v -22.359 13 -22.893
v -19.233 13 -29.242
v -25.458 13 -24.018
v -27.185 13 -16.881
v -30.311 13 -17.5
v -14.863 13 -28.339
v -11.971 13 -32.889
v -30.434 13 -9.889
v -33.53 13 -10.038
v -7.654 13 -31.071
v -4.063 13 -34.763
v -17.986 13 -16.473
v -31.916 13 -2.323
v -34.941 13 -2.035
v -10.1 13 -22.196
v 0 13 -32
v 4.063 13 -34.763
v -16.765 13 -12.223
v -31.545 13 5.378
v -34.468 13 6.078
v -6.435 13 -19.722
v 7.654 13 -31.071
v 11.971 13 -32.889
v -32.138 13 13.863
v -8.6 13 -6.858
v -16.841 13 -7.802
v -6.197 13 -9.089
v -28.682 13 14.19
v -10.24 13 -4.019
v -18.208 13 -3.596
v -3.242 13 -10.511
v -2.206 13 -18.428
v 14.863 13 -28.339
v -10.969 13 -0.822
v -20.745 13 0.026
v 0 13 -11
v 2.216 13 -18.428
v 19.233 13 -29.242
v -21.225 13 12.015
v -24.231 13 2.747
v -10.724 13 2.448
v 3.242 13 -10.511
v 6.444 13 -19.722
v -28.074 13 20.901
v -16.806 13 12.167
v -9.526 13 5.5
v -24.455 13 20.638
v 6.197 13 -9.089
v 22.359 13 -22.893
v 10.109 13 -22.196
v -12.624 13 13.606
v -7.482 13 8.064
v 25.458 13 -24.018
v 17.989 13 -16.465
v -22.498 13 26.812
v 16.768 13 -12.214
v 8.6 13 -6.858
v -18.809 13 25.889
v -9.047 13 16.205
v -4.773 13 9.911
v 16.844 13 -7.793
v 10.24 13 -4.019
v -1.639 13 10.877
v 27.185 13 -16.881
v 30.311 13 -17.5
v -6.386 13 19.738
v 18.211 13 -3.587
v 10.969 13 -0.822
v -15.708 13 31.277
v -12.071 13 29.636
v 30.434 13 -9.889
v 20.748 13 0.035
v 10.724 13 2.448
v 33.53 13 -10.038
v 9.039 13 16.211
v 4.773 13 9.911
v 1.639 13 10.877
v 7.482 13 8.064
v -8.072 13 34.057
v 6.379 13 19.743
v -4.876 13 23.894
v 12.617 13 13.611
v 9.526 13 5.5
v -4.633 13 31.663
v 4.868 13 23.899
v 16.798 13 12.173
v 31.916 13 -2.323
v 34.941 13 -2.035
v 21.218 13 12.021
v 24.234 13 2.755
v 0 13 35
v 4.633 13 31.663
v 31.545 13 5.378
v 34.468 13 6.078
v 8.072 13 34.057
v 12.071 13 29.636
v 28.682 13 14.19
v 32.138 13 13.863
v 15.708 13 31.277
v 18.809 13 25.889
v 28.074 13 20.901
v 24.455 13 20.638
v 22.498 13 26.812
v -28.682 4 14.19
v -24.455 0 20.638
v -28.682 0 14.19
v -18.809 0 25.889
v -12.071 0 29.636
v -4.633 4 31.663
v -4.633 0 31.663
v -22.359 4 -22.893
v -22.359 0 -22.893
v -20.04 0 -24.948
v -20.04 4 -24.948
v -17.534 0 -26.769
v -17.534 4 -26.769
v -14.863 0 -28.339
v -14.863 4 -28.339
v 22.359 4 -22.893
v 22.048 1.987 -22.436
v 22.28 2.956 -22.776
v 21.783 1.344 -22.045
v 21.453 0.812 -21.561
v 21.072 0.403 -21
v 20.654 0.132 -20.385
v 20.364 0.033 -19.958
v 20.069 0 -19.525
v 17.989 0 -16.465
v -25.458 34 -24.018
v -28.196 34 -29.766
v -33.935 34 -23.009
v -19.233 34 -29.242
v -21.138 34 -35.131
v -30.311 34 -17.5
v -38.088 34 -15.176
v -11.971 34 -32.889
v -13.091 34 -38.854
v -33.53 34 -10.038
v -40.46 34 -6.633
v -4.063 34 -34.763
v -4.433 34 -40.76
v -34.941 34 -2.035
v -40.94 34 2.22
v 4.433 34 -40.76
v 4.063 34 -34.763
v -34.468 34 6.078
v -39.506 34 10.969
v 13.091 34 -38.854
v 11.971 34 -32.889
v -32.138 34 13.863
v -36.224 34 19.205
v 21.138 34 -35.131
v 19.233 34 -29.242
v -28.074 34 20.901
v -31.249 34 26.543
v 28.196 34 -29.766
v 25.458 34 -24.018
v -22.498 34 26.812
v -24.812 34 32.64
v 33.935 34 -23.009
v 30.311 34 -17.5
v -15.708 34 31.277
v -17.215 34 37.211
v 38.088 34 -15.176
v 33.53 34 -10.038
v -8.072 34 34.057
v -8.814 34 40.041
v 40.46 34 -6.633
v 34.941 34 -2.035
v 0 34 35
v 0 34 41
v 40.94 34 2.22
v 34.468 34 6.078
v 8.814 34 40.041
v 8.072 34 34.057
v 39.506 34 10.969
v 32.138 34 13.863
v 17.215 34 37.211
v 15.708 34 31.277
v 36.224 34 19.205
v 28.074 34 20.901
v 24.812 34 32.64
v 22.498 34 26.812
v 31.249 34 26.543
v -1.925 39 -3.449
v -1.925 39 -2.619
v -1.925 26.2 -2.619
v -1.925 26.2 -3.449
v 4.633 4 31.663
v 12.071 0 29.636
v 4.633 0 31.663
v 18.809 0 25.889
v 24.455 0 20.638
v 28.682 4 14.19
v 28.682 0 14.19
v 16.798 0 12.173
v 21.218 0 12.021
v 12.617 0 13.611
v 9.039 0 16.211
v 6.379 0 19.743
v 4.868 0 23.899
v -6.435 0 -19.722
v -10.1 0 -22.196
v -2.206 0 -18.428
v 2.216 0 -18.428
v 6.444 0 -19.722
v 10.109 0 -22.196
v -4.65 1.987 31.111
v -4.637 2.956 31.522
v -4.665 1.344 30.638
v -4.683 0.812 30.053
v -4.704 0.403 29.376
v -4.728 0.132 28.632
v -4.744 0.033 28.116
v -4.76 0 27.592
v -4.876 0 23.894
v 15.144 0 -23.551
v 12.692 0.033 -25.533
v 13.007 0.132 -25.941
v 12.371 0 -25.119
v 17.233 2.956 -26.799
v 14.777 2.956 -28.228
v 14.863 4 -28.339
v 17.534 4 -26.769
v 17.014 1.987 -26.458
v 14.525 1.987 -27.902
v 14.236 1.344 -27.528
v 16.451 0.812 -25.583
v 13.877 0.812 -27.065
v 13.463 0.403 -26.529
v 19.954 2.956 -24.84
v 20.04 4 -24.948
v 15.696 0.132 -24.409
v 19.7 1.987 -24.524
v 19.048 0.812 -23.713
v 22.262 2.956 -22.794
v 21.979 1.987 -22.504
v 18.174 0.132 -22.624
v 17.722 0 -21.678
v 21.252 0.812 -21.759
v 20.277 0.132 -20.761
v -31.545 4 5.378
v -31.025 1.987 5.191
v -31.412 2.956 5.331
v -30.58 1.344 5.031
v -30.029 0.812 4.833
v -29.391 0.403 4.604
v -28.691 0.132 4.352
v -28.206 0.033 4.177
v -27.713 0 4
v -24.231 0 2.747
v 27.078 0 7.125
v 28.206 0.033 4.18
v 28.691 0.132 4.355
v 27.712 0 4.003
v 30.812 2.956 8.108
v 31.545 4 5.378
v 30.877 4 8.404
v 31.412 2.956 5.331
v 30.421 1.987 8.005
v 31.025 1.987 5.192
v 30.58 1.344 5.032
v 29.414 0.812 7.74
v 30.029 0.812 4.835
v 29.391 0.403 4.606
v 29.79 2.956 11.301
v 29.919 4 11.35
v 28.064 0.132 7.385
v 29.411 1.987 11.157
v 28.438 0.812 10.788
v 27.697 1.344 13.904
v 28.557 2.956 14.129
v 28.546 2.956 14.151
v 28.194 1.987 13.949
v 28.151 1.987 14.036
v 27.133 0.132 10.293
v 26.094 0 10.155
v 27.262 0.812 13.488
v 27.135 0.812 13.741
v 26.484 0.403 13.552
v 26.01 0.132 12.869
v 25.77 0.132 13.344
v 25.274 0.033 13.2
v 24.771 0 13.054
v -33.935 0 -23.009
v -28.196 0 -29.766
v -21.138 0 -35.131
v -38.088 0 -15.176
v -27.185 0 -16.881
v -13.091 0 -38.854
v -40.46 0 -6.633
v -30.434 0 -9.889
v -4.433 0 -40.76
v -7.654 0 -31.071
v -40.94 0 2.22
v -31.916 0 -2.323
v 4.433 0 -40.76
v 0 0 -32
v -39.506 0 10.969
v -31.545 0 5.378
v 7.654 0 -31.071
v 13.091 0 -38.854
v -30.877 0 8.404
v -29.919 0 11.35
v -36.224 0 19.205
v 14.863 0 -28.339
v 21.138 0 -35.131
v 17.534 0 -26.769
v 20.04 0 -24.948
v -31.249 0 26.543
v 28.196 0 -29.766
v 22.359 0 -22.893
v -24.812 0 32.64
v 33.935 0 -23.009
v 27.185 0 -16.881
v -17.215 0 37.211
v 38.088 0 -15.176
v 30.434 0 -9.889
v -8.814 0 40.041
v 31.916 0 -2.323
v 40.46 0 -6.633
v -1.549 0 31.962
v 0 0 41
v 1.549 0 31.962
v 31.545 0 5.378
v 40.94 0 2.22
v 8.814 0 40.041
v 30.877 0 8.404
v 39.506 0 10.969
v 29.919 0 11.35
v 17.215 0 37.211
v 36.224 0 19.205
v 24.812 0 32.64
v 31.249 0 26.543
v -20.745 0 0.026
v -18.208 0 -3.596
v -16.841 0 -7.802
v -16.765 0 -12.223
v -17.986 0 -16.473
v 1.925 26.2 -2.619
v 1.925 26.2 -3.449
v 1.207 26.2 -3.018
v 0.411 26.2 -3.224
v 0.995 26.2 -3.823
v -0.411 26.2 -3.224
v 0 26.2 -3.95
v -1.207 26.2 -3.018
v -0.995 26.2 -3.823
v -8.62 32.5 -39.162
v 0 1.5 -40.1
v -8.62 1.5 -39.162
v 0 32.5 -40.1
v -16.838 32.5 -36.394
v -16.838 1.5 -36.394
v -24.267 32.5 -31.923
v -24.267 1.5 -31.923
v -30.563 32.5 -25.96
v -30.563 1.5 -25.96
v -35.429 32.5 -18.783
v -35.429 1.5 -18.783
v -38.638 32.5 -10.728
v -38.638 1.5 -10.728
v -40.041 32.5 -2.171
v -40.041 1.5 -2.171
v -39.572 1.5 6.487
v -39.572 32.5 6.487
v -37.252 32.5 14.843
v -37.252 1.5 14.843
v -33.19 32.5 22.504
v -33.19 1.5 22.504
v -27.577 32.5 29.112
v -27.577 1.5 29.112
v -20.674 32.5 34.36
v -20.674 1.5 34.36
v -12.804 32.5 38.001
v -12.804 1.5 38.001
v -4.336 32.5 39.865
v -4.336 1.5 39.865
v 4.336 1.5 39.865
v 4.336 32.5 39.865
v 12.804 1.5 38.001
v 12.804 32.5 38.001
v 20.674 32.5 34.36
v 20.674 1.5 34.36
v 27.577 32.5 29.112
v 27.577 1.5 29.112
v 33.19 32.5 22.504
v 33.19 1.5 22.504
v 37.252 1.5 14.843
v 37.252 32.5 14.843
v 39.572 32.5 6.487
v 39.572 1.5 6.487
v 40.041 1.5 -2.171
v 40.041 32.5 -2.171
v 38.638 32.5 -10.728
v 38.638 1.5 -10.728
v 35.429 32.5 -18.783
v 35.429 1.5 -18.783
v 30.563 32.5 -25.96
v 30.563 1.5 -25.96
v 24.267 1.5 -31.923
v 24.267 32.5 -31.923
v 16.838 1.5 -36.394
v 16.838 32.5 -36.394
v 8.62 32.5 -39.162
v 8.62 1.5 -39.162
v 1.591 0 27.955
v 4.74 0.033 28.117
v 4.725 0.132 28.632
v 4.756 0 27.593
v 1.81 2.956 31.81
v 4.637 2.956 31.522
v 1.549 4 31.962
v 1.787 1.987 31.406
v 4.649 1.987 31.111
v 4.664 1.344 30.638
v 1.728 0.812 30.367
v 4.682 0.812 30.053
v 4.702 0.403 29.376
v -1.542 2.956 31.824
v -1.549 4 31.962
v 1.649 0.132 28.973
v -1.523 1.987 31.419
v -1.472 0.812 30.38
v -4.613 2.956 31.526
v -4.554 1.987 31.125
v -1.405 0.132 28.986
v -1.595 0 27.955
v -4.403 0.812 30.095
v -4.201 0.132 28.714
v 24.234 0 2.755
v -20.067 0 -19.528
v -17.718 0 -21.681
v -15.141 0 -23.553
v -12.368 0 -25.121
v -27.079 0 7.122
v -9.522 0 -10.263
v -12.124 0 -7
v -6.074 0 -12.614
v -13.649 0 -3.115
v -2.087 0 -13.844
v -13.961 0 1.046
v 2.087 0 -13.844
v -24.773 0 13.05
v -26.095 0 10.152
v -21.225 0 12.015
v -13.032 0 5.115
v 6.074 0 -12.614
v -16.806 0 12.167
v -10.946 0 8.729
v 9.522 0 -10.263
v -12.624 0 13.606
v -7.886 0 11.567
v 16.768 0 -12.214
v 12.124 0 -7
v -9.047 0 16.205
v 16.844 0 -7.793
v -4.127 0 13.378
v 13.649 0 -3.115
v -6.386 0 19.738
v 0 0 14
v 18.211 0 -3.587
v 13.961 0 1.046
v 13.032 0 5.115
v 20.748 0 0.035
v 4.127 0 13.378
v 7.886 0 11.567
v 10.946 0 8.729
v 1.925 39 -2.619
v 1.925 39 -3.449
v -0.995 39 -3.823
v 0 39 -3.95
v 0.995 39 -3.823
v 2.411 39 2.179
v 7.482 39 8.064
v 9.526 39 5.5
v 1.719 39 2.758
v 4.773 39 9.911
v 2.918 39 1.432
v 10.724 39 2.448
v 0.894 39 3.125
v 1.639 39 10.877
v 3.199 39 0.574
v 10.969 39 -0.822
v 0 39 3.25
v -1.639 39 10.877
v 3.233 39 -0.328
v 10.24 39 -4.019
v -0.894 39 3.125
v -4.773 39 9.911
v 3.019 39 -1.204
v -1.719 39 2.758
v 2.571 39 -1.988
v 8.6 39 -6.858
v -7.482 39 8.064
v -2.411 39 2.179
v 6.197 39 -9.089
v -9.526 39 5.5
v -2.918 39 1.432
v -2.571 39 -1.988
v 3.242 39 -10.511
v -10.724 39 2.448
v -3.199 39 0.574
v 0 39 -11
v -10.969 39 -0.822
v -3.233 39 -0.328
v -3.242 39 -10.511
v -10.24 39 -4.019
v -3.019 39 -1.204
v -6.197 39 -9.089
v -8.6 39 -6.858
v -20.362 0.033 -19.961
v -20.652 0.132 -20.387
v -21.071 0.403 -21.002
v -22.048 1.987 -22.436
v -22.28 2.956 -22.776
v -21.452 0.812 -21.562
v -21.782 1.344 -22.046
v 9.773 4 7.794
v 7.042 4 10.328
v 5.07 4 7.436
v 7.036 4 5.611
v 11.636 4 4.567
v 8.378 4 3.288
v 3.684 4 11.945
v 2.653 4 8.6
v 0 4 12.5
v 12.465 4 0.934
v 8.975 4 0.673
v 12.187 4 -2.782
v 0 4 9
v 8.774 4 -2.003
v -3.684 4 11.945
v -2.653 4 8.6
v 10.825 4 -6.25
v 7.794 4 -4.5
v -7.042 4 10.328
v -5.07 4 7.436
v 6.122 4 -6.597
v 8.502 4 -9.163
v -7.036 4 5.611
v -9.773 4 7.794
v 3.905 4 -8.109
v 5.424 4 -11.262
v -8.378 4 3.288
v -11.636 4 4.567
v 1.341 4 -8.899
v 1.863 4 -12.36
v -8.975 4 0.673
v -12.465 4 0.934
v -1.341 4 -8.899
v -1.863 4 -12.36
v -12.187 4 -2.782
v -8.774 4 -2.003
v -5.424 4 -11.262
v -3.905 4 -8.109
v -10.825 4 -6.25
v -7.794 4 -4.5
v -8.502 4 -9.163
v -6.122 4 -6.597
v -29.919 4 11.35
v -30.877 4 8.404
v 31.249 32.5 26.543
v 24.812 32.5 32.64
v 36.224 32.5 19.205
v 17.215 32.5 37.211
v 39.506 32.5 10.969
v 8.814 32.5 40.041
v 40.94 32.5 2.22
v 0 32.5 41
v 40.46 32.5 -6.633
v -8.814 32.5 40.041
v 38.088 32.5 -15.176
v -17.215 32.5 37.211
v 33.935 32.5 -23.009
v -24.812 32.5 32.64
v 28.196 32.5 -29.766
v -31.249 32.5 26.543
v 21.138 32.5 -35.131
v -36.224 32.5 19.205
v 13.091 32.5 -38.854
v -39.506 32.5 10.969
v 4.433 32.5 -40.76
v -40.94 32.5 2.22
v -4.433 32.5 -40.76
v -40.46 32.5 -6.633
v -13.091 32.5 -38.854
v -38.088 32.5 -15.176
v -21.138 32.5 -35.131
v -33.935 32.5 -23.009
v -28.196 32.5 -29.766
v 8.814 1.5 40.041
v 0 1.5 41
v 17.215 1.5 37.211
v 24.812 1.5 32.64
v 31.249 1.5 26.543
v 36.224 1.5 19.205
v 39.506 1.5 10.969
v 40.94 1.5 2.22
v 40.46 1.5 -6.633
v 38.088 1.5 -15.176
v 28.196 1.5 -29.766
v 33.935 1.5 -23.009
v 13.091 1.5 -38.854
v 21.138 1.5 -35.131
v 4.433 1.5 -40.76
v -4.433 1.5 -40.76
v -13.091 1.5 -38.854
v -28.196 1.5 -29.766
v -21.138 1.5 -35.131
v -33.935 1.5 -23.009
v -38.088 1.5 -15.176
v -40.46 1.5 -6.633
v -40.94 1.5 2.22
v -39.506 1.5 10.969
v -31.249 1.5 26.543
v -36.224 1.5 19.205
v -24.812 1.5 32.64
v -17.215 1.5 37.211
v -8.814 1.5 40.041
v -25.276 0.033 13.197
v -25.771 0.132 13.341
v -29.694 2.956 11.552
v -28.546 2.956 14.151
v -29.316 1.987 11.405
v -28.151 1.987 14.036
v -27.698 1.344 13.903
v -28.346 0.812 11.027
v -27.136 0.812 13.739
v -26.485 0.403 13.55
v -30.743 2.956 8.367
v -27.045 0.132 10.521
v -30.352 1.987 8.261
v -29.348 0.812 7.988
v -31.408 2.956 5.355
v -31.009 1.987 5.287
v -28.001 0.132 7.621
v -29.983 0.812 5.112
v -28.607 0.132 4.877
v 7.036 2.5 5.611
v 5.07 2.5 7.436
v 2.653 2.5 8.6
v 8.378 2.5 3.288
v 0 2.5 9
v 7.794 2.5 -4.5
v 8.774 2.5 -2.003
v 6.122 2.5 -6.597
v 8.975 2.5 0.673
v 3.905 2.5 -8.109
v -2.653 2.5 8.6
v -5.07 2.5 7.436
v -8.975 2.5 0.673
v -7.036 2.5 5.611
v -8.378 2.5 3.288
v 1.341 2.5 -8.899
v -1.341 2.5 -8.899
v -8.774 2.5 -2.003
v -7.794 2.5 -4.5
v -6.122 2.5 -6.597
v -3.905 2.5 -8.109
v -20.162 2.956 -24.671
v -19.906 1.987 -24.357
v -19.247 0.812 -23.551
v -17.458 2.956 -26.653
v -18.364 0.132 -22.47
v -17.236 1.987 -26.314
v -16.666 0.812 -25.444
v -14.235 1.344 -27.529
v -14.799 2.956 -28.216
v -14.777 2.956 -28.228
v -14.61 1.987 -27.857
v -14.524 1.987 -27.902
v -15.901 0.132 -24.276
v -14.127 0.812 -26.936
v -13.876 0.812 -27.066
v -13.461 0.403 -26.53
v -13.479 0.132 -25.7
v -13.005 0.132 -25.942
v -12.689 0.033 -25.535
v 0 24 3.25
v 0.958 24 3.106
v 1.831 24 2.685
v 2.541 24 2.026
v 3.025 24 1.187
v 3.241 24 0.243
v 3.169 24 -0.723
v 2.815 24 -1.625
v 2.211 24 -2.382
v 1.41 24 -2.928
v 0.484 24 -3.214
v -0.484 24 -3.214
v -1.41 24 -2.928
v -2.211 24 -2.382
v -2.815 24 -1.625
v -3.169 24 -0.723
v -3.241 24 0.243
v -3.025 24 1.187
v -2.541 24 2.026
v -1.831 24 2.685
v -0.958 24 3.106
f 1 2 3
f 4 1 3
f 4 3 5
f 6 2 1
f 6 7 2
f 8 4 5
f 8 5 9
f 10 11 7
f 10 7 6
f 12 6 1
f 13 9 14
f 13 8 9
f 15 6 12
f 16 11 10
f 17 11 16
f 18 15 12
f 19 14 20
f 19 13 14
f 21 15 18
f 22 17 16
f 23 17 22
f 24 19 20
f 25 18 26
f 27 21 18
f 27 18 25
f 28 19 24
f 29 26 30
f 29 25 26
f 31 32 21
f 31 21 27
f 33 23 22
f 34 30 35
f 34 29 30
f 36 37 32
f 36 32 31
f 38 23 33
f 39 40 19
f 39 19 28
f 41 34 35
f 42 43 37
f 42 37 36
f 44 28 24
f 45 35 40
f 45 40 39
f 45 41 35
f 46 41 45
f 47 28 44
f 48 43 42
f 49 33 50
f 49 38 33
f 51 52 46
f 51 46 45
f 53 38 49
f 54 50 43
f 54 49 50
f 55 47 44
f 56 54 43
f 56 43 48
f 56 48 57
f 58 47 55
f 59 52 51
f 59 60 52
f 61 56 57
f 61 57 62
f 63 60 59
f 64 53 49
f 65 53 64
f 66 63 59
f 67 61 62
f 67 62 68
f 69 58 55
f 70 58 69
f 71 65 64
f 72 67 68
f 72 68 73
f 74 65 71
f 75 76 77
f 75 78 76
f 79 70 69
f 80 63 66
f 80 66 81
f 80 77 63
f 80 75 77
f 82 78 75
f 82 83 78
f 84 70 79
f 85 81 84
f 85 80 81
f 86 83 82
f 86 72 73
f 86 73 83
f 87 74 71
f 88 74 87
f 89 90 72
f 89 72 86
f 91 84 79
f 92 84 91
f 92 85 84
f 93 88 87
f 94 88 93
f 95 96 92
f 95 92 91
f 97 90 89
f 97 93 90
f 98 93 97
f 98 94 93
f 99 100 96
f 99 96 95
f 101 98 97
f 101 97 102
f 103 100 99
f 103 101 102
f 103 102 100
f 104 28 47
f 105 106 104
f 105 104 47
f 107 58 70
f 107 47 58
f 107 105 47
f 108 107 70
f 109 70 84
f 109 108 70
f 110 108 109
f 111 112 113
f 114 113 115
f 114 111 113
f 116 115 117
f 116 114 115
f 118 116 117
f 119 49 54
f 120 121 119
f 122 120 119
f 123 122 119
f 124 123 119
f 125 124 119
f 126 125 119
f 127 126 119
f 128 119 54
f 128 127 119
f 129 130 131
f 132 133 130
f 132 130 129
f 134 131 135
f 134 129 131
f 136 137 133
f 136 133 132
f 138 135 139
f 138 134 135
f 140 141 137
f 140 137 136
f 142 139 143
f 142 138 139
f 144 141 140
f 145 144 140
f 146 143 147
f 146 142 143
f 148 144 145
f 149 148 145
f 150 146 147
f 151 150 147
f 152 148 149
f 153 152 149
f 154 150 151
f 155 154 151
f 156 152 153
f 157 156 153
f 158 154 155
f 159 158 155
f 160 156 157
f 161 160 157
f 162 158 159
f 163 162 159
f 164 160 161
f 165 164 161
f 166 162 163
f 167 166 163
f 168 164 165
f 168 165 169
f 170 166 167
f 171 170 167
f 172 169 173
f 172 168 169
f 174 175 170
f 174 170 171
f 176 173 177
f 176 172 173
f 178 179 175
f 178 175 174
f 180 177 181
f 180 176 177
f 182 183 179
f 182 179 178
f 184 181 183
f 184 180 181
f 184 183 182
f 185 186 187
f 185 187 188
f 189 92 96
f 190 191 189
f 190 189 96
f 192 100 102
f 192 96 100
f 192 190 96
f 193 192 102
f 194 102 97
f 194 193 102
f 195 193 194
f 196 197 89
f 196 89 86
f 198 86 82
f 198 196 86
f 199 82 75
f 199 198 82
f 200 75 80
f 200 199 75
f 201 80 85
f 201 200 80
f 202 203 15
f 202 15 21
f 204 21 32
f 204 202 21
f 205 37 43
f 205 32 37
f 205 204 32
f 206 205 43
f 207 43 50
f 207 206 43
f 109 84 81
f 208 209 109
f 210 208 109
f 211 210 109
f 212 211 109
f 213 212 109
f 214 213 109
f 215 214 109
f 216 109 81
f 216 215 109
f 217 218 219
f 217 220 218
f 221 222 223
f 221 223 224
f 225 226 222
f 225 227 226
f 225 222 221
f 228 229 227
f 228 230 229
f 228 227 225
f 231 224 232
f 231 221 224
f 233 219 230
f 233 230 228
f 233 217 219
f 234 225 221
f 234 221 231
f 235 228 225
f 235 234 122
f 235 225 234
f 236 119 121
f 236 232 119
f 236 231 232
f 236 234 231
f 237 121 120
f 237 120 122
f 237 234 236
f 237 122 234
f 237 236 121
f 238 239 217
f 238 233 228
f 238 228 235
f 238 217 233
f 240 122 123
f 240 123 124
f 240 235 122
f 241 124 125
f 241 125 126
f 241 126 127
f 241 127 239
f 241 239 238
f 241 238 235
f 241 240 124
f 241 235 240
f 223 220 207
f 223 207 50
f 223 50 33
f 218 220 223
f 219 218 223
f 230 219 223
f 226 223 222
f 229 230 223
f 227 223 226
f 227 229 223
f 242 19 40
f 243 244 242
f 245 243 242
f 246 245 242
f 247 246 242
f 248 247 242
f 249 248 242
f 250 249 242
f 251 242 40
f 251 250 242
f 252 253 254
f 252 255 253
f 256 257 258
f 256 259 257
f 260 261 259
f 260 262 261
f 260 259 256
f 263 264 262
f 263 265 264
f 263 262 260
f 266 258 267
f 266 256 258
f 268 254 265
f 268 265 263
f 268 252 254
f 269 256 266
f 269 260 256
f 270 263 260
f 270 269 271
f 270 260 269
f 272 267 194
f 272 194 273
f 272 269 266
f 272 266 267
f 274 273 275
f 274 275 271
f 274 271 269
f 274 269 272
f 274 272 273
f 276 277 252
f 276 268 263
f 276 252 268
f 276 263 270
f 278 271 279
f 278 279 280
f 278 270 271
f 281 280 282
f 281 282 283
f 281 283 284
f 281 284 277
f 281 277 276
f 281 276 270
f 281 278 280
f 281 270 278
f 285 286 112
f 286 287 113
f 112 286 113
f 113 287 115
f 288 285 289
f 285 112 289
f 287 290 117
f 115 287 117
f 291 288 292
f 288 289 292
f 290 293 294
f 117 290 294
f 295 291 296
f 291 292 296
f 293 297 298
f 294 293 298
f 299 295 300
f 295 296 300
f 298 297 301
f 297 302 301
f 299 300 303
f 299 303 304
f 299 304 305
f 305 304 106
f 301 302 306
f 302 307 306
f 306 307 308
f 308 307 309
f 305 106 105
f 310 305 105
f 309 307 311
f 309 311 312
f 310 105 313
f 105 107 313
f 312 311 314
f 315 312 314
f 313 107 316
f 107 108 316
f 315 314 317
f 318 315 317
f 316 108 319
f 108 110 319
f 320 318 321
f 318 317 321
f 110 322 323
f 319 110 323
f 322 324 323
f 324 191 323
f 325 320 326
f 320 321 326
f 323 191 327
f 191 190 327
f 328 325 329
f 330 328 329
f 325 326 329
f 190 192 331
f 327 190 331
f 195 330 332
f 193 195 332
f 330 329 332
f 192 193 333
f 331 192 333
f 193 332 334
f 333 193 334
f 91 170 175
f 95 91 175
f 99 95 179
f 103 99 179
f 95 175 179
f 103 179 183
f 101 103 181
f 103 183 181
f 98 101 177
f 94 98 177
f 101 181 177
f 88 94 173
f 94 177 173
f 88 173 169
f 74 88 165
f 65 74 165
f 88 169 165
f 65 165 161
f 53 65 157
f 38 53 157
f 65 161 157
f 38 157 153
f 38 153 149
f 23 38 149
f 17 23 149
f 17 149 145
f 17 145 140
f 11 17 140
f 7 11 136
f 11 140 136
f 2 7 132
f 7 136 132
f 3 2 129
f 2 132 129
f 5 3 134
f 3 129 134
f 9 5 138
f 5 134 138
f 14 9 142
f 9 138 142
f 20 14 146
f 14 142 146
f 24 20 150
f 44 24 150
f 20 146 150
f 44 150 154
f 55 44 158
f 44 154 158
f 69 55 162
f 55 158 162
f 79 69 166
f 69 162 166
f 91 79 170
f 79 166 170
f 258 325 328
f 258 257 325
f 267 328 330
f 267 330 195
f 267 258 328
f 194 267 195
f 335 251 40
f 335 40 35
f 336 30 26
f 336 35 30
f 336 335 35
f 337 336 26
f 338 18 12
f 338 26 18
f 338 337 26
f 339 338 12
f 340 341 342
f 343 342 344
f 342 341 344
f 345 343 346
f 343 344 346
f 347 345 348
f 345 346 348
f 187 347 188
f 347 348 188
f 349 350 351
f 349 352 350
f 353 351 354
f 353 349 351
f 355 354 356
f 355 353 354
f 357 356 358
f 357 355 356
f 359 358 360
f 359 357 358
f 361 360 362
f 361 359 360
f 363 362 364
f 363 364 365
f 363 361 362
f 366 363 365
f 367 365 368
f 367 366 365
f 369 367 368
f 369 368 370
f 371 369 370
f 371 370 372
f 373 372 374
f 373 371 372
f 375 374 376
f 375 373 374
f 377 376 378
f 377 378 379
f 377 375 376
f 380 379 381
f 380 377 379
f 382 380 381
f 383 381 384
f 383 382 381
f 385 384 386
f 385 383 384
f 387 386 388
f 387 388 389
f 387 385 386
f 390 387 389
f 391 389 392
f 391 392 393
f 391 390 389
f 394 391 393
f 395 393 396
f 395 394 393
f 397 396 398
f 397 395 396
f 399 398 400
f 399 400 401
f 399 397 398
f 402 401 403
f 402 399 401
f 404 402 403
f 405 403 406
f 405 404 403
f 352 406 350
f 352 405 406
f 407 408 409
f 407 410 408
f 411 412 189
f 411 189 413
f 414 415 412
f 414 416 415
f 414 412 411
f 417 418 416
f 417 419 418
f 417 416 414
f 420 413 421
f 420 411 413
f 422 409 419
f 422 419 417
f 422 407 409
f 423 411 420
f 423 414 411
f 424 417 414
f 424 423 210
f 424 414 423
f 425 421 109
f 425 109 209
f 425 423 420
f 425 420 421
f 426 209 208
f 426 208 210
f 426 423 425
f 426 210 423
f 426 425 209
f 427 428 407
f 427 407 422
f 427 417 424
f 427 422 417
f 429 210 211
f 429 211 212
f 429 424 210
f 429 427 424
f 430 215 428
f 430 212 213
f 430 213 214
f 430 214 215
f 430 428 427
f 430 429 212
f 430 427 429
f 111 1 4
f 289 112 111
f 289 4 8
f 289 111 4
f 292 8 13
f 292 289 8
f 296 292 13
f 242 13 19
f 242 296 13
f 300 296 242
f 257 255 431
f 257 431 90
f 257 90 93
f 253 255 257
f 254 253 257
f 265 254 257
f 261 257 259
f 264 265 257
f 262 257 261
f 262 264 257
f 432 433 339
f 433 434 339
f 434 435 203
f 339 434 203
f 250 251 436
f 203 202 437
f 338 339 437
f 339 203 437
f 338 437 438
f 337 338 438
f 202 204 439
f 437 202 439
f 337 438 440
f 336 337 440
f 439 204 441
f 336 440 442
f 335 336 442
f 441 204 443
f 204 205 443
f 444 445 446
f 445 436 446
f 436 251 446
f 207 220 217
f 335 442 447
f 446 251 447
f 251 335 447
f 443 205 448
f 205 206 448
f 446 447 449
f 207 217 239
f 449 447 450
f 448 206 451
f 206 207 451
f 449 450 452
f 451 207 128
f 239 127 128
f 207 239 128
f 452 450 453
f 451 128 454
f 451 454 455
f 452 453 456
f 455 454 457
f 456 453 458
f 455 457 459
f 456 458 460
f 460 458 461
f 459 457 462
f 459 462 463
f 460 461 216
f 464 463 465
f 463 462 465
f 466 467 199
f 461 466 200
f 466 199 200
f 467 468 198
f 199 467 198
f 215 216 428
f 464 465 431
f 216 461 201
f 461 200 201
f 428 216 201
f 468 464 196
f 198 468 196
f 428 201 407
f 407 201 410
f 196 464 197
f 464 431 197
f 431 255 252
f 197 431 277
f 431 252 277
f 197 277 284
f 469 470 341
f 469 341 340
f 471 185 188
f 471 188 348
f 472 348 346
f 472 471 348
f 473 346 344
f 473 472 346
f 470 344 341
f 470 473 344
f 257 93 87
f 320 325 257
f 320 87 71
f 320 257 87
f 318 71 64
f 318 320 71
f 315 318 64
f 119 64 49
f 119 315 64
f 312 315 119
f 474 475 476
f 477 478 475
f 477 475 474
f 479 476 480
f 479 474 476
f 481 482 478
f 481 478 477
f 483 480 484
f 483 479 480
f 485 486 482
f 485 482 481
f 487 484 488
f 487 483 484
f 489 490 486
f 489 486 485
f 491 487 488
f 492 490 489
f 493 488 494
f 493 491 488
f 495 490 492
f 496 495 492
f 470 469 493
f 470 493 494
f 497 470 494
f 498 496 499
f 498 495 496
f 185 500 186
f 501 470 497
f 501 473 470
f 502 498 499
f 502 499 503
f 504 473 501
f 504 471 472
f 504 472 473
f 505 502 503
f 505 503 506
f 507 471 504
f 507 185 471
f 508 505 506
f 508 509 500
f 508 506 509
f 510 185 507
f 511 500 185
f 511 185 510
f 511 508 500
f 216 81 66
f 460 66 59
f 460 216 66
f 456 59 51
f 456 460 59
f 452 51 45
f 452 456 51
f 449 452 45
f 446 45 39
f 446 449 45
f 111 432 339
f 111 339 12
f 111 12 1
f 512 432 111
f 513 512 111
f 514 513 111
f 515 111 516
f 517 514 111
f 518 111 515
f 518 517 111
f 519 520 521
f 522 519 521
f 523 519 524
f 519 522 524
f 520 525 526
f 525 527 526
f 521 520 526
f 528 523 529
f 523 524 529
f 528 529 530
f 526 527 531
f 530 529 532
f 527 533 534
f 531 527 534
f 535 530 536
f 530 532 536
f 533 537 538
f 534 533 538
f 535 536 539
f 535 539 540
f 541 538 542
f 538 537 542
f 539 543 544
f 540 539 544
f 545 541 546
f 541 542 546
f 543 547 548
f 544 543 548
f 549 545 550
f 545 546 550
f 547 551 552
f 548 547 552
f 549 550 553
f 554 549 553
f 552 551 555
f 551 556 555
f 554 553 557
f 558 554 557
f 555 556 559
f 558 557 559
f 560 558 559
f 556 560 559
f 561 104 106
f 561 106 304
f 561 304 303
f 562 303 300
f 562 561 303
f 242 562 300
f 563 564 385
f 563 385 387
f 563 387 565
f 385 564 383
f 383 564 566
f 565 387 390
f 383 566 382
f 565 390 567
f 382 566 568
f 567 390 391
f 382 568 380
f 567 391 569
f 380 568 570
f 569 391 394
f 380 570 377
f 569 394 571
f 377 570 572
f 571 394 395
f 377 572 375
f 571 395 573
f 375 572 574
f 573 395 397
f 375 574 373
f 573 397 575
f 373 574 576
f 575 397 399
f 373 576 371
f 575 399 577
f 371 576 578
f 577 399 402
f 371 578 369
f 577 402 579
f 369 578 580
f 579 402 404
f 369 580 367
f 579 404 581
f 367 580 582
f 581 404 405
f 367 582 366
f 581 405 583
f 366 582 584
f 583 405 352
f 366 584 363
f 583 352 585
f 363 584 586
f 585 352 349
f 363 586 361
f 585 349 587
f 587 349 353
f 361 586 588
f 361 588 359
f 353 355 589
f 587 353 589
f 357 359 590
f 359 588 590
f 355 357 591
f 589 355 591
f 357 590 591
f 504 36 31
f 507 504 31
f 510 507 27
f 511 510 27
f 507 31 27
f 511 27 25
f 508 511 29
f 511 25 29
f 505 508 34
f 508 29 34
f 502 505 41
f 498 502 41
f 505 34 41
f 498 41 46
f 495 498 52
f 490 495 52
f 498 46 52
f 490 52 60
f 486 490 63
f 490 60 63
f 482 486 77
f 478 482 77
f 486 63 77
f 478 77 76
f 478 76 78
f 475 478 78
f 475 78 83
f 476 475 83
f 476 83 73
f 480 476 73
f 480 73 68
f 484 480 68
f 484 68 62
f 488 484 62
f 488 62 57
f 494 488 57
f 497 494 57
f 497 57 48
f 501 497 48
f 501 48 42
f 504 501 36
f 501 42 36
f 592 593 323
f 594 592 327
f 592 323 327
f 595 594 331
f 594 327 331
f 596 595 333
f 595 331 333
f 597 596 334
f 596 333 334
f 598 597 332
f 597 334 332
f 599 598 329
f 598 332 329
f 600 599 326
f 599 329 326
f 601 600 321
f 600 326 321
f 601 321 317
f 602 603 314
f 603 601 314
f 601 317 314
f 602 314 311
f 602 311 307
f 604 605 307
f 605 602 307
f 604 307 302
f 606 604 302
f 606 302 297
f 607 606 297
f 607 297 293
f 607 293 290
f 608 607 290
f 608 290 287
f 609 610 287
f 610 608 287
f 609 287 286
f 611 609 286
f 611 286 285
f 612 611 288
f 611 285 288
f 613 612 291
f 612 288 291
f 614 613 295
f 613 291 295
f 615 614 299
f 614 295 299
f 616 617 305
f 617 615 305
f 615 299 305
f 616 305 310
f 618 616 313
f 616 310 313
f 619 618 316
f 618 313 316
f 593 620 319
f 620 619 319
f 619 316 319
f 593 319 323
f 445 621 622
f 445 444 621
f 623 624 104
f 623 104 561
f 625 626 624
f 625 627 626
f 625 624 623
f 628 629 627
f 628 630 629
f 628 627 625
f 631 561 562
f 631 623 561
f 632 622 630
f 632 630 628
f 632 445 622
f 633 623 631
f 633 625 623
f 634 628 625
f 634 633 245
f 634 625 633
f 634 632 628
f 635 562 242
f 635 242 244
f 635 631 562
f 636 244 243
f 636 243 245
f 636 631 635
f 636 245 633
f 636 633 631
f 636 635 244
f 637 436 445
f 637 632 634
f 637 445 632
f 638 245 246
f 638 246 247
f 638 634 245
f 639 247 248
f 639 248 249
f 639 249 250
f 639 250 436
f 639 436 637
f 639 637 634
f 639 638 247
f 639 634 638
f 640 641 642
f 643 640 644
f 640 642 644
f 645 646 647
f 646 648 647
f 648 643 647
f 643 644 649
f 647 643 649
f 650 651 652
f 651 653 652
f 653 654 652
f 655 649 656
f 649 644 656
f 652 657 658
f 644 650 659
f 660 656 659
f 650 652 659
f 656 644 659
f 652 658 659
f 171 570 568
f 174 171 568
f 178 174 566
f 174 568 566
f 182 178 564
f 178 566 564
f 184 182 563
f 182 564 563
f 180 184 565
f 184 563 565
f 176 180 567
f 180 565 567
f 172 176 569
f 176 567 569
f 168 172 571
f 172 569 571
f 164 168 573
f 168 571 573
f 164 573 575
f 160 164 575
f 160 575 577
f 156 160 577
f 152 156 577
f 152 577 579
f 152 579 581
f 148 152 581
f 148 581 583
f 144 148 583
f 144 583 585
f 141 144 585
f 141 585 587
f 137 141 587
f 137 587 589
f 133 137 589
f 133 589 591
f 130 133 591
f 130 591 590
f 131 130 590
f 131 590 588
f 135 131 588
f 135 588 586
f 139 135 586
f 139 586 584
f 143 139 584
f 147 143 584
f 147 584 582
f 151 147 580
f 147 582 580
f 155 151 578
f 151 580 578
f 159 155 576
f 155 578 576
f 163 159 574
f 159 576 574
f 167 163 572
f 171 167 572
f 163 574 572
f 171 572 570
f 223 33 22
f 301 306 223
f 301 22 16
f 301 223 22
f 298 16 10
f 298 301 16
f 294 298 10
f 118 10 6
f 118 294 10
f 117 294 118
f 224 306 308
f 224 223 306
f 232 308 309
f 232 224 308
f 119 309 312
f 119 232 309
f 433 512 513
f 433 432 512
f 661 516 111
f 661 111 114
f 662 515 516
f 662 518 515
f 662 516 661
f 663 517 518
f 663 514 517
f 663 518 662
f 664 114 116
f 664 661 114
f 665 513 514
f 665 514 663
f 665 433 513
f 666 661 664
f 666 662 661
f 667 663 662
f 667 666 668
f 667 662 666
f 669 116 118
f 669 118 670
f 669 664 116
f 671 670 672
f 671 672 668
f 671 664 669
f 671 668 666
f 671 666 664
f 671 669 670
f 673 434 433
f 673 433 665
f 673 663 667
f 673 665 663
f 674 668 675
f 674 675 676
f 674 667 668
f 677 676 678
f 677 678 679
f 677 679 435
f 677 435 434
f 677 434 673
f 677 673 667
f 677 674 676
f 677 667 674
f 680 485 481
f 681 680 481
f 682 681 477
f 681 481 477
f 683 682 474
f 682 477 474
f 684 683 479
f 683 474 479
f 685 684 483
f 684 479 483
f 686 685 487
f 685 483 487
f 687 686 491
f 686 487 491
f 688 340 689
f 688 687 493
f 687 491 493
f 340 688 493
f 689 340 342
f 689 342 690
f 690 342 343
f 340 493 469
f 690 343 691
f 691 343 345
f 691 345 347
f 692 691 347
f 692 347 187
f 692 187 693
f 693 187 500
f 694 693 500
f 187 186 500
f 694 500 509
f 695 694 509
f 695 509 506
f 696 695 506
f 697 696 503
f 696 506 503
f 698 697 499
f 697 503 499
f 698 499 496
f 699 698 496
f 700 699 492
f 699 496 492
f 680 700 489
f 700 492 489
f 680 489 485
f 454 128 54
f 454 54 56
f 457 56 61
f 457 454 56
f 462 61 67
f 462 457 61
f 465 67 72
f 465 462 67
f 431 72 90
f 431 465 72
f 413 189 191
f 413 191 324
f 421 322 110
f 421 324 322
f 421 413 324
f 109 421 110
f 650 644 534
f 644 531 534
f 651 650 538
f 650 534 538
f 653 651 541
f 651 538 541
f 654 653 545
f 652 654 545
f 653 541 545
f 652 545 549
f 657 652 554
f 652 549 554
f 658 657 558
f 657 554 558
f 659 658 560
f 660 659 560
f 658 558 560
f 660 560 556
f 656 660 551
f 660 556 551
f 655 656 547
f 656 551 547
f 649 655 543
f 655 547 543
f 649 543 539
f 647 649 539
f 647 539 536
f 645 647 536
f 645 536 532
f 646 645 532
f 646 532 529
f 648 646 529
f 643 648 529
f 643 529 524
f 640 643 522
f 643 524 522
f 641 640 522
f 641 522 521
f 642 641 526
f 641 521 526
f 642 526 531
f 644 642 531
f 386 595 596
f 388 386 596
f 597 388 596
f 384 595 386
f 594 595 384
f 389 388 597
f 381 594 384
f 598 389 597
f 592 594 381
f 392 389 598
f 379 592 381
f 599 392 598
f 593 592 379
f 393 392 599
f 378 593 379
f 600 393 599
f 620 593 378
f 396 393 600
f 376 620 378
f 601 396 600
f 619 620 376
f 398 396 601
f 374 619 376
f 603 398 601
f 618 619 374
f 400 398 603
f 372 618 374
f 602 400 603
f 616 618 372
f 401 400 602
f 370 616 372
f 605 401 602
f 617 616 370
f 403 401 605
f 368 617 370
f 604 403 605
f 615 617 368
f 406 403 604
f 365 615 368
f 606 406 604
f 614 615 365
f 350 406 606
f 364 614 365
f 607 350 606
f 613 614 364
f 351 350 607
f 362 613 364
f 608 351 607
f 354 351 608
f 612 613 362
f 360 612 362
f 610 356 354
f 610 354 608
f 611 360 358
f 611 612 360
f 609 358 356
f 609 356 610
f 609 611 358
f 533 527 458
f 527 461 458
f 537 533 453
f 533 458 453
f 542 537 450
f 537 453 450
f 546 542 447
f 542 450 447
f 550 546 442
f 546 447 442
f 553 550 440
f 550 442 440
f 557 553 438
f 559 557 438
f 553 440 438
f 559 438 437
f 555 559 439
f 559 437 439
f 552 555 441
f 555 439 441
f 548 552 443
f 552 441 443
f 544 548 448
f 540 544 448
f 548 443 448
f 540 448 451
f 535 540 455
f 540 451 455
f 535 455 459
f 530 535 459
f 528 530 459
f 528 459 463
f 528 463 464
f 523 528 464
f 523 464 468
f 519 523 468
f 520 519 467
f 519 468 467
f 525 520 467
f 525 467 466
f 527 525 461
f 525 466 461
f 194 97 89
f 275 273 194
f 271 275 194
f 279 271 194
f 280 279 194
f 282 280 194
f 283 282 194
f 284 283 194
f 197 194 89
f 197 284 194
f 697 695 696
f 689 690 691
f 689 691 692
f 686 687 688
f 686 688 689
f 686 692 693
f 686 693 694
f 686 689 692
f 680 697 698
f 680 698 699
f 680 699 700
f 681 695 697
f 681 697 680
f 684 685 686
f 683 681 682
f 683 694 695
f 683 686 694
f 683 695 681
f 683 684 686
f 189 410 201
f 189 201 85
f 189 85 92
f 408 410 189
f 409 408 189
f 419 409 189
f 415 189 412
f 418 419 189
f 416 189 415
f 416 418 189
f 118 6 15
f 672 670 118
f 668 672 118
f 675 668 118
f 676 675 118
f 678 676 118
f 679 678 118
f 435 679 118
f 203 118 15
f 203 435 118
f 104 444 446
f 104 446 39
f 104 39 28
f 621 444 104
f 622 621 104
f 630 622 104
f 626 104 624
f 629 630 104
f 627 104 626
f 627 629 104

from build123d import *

# Parameters (mm, degrees)
SKETCH1_R             = 41
BOSS_EXTRUDE1_DEPTH   = 34
SKETCH2_R             = 35
CUT_EXTRUDE1_DEPTH    = 21
CUT_EXTRUDE2_DEPTH    = 21
SKETCH6_R             = 11
BOSS_EXTRUDE2_DEPTH   = 26
ESBO_O1_R             = 3.25
CORTE_EXTRUS_O1_DEPTH = 15
ESBO_O2_W             = 0.9
ESBO_O2_H             = 31
CORTE_EXTRUS_O4_DEPTH = 12.8


with BuildPart() as part:
    # Sketch1 → Boss-Extrude1 (new body)
    with BuildSketch(Plane(origin=(0, 0, 0), x_dir=(1, 0, 0), z_dir=(0, 1, 0))):
        with Locations(Location((0, 0, 0), (0, 0, 270))):
            Circle(SKETCH1_R)
    extrude(amount=BOSS_EXTRUDE1_DEPTH)

    # Sketch2 → Cut-Extrude1 (cut)
    with BuildSketch(Plane(origin=(0, 34, 0), x_dir=(1, 0, 0), z_dir=(0, 1, 0))):
        with Locations(Location((0, 0, 0), (0, 0, 270))):
            Circle(SKETCH2_R)
    extrude(amount=-CUT_EXTRUDE1_DEPTH, mode=Mode.SUBTRACT)

    # Sketch3 → Cut-Extrude2 (cut)
    with BuildSketch(Plane.XZ):
        with BuildLine():
            Line((-4.632760116, 31.662873112), (-4.875607394, 23.89373544))
            ThreePointArc((-4.875607394, 23.89373544), (-10.738660694, 14.77258834), (-21.225170188, 12.015082756))
            Line((-21.225170188, 12.015082756), (-28.681580191, 14.190382579))
            ThreePointArc((-28.681580191, 14.190382579), (-18.809128073, 25.88854382), (-4.632760116, 31.662873112))
        make_face()
        with BuildLine():
            Line((28.681580191, 14.190382579), (21.217647246, 12.020548493))
            ThreePointArc((21.217647246, 12.020548493), (10.731137752, 14.778054077), (4.868084452, 23.899201177))
            Line((4.868084452, 23.899201177), (4.632760116, 31.662873112))
            ThreePointArc((4.632760116, 31.662873112), (18.809128073, 25.88854382), (28.681580191, 14.190382579))
        make_face()
        with BuildLine():
            Line((22.358951525, -22.892734365), (17.988834553, -16.464627908))
            ThreePointArc((17.988834553, -16.464627908), (17.370868563, -5.639248633), (24.23381184, 2.755435876))
            Line((24.23381184, 2.755435876), (31.544783405, 5.378349186))
            ThreePointArc((31.544783405, 5.378349186), (30.433808521, -9.88854382), (22.358951525, -22.892734365))
        make_face()
        with BuildLine():
            Line((-14.862988196, -28.338870512), (-10.099936075, -22.196248152))
            ThreePointArc((-10.099936075, -22.196248152), (0.004649434, -18.263301403), (10.109234942, -22.196248152))
            Line((10.109234942, -22.196248152), (14.862988196, -28.338870512))
            ThreePointArc((14.862988196, -28.338870512), (0, -32), (-14.862988196, -28.338870512))
        make_face()
        with BuildLine():
            Line((-31.544783405, 5.378349186), (-24.230938331, 2.746592128))
            ThreePointArc((-24.230938331, 2.746592128), (-17.367995055, -5.648092381), (-17.985961045, -16.473471657))
            Line((-17.985961045, -16.473471657), (-22.358951525, -22.892734365))
            ThreePointArc((-22.358951525, -22.892734365), (-30.433808521, -9.88854382), (-31.544783405, 5.378349186))
        make_face()
    extrude(amount=-CUT_EXTRUDE2_DEPTH, mode=Mode.SUBTRACT)

    # Sketch5 → Cut-Revolve1 (revolve, cut)
    with BuildSketch(Plane.XY, mode=Mode.PRIVATE) as cut_revolve1_sk:
        with BuildLine():
            Line((28, 0), (32, 0))
            Line((32, 0), (32, 4))
            ThreePointArc((32, 4), (30.828427125, 1.171572875), (28, 0))
        make_face()
        Polygon((0, 0), (0, 2.5), (9, 2.5), (9, 4), (12.5, 4), (14, 0), align=None)
    revolve(cut_revolve1_sk.sketch.rotate(Axis((0, 34, 0), (0, -1, 0)), 90), axis=Axis((0, 34, 0), (0, -1, 0)), mode=Mode.SUBTRACT)

    # Sketch6 → Boss-Extrude2 (add)
    with BuildSketch(Plane(origin=(0, 13, 0), x_dir=(1, 0, 0), z_dir=(0, 1, 0))):
        with Locations(Location((0, 0, 0), (0, 0, 90))):
            Circle(SKETCH6_R)
    extrude(amount=BOSS_EXTRUDE2_DEPTH)

    # Esboço1 → Corte-extrusão1 (cut)
    with BuildSketch(Plane(origin=(0, 39, 0), x_dir=(1, 0, 0), z_dir=(0, 1, 0))):
        with Locations(Location((0, 0, 0), (0, 0, 270))):
            Circle(ESBO_O1_R)
    extrude(amount=-CORTE_EXTRUS_O1_DEPTH, mode=Mode.SUBTRACT)

    # Esboço2 → Corte-Revolução1 (revolve, cut)
    with BuildSketch(Plane.XY, mode=Mode.PRIVATE) as corte_revolu_o1_sk:
        with Locations((-40.55, 17)):
            Rectangle(ESBO_O2_W, ESBO_O2_H)
    revolve(corte_revolu_o1_sk.sketch.rotate(Axis((0, -9.512295102, 0), (0, 1, 0)), 270), axis=Axis((0, -9.512295102, 0), (0, 1, 0)), mode=Mode.SUBTRACT)

    # Esboço3 → Corte-extrusão4 (cut)
    with BuildSketch(Plane(origin=(0, 39, 0), x_dir=(1, 0, 0), z_dir=(0, 1, 0))):
        with BuildLine():
            Line((-1.925, 2.618563538), (-1.925, 3.449184686))
            ThreePointArc((-1.925, 3.449184686), (0, 3.95), (1.925, 3.449184686))
            Line((1.925, 3.449184686), (1.925, 2.618563538))
            ThreePointArc((1.925, 2.618563538), (0, 3.25), (-1.925, 2.618563538))
        make_face()
    extrude(amount=-CORTE_EXTRUS_O4_DEPTH, mode=Mode.SUBTRACT)


solid = part.part
